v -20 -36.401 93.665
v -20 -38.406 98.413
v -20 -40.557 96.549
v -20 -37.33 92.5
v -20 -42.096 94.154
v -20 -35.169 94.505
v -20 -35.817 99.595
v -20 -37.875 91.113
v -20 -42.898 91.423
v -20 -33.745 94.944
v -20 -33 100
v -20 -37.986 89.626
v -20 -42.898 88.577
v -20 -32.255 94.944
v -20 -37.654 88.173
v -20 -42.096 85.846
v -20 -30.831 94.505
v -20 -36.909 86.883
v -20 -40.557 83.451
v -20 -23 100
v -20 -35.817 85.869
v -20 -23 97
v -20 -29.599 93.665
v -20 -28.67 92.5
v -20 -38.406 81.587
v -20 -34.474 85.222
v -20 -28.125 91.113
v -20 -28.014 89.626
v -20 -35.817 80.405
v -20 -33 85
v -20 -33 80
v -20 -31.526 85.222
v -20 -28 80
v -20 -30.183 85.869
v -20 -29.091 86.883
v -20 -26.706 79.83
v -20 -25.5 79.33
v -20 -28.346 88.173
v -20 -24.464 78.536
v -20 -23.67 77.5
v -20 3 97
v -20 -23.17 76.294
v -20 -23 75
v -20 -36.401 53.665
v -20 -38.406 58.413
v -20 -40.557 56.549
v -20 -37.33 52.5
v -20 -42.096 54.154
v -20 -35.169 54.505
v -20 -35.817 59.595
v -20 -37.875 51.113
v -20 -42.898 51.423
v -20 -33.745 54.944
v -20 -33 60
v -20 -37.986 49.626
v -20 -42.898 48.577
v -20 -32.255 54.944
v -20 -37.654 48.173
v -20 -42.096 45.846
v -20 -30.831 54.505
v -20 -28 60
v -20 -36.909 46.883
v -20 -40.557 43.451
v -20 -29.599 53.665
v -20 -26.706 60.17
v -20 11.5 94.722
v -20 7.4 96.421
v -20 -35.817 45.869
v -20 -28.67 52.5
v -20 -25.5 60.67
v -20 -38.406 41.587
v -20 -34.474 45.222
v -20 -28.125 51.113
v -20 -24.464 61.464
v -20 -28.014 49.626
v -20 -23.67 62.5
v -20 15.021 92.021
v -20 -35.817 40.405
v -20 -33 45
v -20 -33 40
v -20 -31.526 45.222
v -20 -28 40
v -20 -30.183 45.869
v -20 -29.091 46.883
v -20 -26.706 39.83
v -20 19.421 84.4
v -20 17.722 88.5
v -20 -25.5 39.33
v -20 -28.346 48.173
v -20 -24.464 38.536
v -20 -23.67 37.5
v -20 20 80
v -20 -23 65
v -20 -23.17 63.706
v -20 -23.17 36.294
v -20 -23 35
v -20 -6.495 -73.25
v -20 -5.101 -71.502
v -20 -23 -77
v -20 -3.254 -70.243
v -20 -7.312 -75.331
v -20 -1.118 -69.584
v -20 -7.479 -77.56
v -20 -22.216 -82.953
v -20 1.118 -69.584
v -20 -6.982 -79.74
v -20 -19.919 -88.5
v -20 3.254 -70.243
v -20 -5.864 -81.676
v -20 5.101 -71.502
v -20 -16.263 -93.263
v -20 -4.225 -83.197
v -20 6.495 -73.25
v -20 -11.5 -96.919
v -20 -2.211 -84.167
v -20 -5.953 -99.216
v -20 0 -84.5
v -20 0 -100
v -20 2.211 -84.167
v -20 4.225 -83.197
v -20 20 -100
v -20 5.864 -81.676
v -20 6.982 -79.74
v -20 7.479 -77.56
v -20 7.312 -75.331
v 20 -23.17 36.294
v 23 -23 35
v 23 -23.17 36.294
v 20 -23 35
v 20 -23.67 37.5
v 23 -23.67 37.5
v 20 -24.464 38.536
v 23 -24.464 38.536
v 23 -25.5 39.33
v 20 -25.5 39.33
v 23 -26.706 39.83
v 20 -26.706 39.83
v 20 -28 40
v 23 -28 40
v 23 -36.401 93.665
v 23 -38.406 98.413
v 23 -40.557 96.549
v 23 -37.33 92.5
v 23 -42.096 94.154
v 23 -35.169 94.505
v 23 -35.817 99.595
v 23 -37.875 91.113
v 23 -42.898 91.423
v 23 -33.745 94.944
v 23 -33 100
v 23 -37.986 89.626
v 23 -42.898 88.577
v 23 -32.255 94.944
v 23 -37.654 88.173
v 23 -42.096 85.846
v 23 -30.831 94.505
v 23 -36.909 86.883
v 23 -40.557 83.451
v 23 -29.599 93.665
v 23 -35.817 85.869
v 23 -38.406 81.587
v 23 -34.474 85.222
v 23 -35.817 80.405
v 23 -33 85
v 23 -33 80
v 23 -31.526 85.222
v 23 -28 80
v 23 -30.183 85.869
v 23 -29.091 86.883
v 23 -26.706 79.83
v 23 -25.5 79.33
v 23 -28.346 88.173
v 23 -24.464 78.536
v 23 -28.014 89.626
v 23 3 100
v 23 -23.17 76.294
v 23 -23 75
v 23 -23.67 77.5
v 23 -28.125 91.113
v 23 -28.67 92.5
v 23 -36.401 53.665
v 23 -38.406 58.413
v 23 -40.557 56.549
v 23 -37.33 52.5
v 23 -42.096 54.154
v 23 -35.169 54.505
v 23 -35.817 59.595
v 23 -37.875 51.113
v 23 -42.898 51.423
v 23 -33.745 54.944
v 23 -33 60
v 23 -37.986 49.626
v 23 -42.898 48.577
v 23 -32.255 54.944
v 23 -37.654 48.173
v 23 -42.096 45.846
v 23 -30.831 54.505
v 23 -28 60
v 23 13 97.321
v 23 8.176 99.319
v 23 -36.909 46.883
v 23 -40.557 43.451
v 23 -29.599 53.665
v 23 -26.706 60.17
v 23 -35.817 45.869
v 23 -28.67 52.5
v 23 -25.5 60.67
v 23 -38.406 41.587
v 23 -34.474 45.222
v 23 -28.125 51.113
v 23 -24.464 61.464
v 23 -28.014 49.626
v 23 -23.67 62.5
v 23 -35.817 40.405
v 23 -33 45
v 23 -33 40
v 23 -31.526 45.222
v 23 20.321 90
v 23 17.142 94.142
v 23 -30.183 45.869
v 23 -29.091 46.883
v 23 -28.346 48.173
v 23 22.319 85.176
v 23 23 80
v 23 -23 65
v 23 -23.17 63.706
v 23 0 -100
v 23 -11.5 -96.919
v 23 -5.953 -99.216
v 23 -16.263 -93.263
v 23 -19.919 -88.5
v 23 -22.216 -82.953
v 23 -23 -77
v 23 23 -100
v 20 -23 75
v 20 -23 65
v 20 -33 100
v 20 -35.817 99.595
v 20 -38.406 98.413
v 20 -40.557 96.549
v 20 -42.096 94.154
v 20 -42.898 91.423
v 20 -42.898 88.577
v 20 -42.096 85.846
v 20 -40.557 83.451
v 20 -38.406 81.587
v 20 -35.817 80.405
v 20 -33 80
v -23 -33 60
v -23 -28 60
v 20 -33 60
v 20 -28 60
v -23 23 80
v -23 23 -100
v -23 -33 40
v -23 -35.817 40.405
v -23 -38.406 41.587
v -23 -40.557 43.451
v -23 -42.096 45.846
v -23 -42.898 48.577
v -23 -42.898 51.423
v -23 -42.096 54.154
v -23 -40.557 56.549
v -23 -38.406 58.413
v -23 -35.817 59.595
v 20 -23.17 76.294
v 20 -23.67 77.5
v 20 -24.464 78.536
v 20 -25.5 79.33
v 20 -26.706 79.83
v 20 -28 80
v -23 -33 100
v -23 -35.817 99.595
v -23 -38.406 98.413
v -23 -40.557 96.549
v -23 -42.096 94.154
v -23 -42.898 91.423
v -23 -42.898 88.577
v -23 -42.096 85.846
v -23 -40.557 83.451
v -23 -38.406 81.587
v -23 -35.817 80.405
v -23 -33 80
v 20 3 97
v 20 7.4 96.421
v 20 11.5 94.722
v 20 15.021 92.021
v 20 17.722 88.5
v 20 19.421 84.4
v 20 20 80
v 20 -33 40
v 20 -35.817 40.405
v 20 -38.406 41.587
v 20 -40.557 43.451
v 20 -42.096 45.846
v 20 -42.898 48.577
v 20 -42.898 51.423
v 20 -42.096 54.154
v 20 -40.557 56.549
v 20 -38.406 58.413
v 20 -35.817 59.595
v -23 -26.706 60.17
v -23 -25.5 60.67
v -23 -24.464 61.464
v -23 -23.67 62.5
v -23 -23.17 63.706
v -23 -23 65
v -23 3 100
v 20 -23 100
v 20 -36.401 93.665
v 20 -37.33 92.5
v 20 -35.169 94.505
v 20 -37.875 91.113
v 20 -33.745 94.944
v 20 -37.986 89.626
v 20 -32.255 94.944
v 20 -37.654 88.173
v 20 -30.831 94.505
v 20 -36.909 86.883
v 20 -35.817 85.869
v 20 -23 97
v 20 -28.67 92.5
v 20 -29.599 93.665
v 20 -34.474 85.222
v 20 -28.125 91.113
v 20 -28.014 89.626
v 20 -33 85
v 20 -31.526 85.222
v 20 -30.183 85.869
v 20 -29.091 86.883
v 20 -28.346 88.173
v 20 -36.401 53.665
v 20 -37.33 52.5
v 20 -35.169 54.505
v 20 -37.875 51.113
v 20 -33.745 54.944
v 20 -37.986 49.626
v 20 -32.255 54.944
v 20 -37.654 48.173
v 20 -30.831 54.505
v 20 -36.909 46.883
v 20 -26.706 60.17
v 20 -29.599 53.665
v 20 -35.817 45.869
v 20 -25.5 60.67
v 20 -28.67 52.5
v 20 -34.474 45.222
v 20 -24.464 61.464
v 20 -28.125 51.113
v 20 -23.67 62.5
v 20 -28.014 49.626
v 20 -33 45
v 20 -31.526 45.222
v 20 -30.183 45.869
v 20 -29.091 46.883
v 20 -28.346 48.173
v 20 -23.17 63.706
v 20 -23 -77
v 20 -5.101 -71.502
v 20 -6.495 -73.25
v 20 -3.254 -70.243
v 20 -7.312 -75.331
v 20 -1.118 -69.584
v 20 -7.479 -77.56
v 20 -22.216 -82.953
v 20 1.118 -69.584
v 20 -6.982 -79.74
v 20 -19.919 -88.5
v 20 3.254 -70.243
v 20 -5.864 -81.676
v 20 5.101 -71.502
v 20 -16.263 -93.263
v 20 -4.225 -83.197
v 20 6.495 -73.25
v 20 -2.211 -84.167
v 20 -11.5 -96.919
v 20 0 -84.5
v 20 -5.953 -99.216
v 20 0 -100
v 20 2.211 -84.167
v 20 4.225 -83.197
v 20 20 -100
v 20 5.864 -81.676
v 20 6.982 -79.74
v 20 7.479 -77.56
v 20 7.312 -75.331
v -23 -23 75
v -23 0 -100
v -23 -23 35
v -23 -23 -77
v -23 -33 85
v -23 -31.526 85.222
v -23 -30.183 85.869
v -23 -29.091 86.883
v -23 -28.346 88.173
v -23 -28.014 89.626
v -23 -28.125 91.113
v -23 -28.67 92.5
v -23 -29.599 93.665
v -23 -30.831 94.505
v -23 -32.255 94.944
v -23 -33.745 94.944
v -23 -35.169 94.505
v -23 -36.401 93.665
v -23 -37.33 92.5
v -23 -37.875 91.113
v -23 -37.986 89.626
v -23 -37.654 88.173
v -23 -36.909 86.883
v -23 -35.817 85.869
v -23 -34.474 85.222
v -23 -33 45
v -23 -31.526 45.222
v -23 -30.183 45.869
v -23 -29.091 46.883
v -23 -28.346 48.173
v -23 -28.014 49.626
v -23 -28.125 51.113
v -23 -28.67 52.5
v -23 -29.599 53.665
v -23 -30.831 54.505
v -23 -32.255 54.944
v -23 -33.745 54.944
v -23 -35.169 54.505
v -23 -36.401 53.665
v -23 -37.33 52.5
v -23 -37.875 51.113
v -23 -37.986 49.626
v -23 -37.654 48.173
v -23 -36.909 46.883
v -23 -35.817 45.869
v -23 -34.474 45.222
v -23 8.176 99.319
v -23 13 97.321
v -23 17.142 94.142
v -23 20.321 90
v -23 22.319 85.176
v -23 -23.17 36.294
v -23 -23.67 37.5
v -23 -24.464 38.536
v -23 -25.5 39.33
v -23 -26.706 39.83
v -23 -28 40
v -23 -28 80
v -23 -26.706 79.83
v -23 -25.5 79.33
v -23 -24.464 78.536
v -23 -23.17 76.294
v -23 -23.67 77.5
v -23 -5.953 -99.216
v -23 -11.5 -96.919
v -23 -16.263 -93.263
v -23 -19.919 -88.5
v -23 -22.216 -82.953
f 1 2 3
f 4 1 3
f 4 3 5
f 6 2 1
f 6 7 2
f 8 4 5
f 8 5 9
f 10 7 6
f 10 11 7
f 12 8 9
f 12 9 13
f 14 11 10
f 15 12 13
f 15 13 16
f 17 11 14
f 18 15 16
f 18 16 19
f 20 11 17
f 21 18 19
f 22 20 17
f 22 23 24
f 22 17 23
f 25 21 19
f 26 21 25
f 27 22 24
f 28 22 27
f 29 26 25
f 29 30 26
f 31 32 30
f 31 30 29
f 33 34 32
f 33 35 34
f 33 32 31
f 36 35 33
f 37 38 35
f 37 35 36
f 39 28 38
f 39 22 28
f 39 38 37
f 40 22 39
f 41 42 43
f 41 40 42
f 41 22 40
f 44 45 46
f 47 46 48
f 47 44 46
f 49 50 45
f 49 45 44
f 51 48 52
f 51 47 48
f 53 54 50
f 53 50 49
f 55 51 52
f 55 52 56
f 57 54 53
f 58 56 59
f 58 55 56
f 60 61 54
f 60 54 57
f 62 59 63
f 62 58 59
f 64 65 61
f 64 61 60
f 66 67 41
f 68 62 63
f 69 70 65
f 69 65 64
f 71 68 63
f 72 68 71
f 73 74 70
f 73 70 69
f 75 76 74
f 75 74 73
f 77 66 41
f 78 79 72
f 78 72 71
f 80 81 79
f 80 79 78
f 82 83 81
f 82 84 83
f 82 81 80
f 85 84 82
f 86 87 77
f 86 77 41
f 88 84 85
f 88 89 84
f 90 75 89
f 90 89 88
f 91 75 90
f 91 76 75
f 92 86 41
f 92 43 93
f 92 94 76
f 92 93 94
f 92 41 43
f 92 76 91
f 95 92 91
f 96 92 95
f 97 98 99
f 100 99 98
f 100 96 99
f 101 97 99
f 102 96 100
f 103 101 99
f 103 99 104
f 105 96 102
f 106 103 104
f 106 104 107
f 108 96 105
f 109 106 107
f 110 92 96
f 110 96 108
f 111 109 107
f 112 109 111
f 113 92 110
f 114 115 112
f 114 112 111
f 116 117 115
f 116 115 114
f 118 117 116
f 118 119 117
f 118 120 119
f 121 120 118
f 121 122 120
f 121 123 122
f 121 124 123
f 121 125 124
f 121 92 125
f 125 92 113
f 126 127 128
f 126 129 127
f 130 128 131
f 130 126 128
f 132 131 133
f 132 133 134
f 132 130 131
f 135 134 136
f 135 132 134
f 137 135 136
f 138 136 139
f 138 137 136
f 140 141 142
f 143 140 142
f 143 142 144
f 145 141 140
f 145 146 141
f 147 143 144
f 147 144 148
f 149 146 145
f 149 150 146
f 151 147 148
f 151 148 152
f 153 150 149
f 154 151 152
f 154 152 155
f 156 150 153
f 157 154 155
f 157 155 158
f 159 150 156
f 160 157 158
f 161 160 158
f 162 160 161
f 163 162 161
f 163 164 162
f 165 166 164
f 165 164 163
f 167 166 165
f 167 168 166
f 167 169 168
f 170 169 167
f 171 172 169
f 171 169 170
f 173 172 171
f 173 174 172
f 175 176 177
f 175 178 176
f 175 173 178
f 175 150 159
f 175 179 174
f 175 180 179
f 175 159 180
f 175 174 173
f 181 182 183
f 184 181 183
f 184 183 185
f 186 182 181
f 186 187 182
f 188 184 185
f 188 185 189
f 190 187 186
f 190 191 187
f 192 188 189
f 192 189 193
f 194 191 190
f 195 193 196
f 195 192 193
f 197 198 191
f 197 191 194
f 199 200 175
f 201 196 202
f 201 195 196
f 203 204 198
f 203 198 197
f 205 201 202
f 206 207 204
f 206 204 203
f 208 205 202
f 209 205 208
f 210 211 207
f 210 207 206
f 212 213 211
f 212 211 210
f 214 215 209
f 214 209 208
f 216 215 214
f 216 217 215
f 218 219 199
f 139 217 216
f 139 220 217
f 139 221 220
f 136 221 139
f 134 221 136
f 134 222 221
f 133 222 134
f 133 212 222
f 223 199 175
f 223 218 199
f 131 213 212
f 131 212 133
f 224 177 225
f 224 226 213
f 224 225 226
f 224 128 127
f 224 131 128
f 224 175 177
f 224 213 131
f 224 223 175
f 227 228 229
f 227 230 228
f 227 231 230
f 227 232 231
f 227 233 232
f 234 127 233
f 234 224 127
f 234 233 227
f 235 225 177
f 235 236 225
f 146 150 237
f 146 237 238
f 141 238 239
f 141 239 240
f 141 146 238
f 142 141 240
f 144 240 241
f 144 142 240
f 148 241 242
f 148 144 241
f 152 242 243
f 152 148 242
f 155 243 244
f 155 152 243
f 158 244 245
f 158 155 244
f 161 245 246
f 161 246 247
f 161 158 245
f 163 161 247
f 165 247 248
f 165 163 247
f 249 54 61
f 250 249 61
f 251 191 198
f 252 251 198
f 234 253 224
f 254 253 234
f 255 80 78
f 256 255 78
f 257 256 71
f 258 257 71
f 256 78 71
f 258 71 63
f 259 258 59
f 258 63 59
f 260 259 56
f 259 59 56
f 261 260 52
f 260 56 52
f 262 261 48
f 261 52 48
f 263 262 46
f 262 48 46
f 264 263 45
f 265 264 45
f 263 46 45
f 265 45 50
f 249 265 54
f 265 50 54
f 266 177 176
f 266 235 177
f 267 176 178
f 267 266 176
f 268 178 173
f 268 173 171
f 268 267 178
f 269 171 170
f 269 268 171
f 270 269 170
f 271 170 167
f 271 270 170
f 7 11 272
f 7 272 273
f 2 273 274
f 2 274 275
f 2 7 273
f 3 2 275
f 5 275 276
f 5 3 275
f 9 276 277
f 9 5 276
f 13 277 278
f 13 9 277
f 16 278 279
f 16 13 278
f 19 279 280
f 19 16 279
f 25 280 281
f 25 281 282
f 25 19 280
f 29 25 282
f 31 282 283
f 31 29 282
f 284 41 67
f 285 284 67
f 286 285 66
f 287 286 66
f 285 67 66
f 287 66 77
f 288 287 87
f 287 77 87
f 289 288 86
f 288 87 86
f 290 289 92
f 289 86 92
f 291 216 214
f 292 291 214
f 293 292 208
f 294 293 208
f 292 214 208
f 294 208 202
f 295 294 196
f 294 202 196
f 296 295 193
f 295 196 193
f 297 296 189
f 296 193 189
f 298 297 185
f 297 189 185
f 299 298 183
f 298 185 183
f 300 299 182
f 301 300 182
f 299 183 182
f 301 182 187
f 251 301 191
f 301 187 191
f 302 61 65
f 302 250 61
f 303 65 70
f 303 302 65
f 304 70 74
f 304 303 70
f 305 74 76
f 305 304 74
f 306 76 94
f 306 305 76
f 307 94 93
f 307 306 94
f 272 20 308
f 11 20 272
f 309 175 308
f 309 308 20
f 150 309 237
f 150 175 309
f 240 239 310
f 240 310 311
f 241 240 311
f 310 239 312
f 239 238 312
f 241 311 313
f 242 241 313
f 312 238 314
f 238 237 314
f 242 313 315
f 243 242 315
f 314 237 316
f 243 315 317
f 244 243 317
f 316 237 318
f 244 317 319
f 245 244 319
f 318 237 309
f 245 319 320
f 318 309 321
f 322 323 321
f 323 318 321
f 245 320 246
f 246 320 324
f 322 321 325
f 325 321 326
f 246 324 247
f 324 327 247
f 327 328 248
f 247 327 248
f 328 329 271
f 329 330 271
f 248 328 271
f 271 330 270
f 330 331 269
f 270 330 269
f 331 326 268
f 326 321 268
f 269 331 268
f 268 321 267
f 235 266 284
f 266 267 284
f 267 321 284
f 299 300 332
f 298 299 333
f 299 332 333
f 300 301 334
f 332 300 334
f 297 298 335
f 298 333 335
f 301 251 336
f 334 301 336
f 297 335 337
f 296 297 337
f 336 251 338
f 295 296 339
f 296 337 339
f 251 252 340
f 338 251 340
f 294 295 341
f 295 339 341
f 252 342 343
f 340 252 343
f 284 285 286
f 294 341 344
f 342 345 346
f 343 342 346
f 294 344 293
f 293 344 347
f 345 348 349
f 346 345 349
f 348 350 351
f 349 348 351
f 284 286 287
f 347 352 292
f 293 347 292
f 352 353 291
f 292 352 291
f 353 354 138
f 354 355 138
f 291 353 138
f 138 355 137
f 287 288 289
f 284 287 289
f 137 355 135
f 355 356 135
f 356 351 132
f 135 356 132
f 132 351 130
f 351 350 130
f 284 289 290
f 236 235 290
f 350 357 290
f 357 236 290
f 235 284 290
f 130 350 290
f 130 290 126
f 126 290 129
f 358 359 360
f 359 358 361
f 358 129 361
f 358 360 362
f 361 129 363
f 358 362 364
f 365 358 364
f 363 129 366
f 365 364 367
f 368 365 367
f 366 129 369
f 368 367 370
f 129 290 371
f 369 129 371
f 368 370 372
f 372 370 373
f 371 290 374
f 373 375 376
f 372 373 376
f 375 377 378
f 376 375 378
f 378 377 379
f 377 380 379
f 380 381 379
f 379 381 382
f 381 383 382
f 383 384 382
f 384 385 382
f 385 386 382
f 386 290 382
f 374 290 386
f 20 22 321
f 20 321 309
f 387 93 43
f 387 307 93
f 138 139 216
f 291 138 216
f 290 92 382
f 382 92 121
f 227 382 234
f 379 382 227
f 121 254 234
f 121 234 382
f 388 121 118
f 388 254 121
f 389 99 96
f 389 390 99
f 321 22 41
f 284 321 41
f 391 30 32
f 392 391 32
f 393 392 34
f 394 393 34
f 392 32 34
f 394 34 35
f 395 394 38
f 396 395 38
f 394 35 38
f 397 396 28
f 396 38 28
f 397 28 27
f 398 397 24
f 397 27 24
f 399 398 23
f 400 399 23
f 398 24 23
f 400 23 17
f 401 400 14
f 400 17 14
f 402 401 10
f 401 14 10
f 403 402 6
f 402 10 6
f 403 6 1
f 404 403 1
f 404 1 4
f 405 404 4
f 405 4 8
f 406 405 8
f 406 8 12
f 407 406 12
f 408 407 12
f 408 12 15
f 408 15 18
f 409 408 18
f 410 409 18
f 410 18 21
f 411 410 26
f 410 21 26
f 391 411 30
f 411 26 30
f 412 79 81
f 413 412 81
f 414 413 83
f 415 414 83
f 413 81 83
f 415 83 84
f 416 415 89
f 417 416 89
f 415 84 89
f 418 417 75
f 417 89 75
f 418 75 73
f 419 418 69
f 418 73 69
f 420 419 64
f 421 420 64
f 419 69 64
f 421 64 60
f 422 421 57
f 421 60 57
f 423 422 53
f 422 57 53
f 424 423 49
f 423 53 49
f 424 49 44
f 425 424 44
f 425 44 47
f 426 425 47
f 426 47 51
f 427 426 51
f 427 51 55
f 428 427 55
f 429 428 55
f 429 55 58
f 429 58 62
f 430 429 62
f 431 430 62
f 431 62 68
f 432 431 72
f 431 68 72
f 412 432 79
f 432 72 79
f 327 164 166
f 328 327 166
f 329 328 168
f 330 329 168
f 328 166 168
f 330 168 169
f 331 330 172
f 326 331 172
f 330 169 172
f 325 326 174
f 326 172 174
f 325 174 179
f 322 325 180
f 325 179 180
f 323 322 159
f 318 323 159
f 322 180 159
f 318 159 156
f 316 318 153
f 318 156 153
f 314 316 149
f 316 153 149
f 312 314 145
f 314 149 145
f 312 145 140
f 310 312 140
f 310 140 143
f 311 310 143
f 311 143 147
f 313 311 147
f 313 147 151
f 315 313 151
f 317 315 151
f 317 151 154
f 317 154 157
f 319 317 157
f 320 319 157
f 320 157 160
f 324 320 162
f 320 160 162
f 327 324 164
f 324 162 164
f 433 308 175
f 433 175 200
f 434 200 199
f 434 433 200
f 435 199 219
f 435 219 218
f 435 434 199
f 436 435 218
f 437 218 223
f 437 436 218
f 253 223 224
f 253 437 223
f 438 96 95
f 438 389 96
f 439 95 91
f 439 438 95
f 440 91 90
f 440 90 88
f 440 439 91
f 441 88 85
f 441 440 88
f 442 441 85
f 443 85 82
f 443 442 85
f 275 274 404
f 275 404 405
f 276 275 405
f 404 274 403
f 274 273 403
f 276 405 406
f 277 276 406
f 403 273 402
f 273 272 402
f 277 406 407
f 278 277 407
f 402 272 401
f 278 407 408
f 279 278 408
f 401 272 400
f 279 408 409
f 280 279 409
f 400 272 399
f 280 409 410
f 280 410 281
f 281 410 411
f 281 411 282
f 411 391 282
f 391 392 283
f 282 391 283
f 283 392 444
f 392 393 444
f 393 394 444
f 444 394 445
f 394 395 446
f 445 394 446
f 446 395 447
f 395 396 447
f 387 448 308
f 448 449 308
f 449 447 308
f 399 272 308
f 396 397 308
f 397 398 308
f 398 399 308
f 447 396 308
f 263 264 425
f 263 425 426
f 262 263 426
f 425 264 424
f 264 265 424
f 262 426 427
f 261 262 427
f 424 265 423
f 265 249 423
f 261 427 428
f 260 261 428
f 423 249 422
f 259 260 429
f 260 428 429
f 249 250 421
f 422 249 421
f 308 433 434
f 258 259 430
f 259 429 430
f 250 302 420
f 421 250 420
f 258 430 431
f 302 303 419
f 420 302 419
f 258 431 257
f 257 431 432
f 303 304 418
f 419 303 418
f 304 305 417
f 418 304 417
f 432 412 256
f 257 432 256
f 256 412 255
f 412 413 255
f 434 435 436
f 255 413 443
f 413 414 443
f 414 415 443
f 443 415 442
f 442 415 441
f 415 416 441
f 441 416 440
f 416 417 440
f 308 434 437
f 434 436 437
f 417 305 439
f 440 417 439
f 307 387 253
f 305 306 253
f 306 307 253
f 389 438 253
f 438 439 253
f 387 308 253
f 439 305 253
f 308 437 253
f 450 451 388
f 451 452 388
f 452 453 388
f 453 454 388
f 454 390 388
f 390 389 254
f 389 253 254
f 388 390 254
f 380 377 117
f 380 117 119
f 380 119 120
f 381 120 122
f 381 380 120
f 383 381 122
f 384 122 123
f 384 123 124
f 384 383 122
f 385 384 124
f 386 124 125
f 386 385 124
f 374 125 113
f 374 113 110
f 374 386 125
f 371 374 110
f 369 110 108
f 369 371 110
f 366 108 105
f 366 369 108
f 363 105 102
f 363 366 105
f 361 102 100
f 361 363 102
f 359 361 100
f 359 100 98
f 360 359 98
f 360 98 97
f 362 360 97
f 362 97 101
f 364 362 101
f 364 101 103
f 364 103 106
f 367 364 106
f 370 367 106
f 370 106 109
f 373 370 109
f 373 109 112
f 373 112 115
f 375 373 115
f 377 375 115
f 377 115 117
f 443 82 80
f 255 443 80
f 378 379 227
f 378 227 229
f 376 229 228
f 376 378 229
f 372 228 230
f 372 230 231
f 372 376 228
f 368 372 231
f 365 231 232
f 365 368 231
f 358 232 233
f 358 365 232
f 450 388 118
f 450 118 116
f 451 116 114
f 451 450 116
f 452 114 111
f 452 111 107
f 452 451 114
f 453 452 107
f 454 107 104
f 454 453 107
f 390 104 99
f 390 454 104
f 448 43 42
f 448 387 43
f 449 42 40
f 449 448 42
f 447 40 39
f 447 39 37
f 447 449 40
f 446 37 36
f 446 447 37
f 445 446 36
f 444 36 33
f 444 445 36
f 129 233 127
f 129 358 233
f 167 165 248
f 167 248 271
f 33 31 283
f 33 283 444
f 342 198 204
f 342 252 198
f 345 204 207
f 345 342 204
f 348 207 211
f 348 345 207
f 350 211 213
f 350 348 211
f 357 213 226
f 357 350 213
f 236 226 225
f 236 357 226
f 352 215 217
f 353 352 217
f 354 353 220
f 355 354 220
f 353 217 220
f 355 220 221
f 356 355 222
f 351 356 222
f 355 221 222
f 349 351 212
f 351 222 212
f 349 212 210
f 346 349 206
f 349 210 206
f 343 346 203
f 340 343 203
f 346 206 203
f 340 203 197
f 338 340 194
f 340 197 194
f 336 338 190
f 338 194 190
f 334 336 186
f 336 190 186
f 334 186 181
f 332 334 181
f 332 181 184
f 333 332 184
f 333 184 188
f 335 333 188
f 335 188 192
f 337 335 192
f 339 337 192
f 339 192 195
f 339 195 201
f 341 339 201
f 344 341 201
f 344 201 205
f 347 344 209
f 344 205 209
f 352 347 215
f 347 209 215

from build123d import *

# Parameters (mm, degrees)
PROFILE_EXTRUDE_DEPTH               = 23
PROFILE_EXTRUDE_DEPTH_BACK          = 23
PROFILE_SHELL_T                     = -3
CUFF_JOINT_PIN_SKETCH_R             = 7.5
CUFF_JOIN_PIN_EXTRUDE_DEPTH         = 43
HYDRAULIC_ARM_HOLES_SKETCH_R        = 5
HYDRAULIC_ARM_HOLES_EXTRUDE_1_DEPTH = 3
HYDRAULIC_START                     = -43
HYDRAULIC_ARM_HOLES_SKETCH_2_R      = 5
HYDRAULIC_ARM_HOLES_EXTRUDE_2_DEPTH = 3
HOLES_TABS_FILLET_R                 = 5


with BuildPart() as part:
    # Profile Sketch → Profile Extrude (new, two sides: drawn at the far end of the back side and taken through both)
    with BuildSketch(Plane(origin=(0, 0, 0), x_dir=(0, 0, -1), z_dir=(1, 0, 0)).offset(-PROFILE_EXTRUDE_DEPTH_BACK)):
        with BuildLine():
            Line((-80, 23), (100, 23))
            Line((100, 23), (100, 0))
            ThreePointArc((100, 0), (93.263455967, -16.263455967), (77, -23))
            Line((77, -23), (-100, -23))
            Line((-100, -23), (-100, 3))
            ThreePointArc((-100, 3), (-94.142135624, 17.142135624), (-80, 23))
        make_face()
    extrude(amount=PROFILE_EXTRUDE_DEPTH + PROFILE_EXTRUDE_DEPTH_BACK)

    # Profile Shell
    profile_shell_openings = [part.faces().sort_by_distance(p)[0] for p in [
        (0, 11.5, -100),
        (0, -16.263455967, -93.263455967),
        (0, -23, 11.5),
    ]]
    offset(amount=PROFILE_SHELL_T, openings=profile_shell_openings, kind=Kind.INTERSECTION)

    # Cuff Joint Pin Sketch → Cuff Join Pin Extrude (add)
    with BuildSketch(Plane(origin=(23, 0, 0), x_dir=(0, 0, -1), z_dir=(1, 0, 0))):
        with Locations((77, 0)):
            Circle(CUFF_JOINT_PIN_SKETCH_R)
    extrude(amount=-CUFF_JOIN_PIN_EXTRUDE_DEPTH)

    # Hydraulic Arm Holes Sketch → Hydraulic Arm Holes Extrude 1 (add)
    # profile 1 of 2: a face of its own
    with BuildSketch(Plane(origin=(23, 0, 0), x_dir=(0, 0, -1), z_dir=(1, 0, 0))):
        with BuildLine():
            Line((-100, -23), (-100, -33))
            ThreePointArc((-100, -33), (-90, -43), (-80, -33))
            Line((-80, -33), (-80, -23))
            Line((-80, -23), (-100, -23))
        make_face()
        with Locations((-90, -33)):
            Circle(HYDRAULIC_ARM_HOLES_SKETCH_R, mode=Mode.SUBTRACT)
    # profile 2 of 2: a face of its own
    with BuildSketch(Plane(origin=(23, 0, 0), x_dir=(0, 0, -1), z_dir=(1, 0, 0))):
        with BuildLine():
            Line((-60, -33), (-60, -23))
            Line((-60, -23), (-40, -23))
            Line((-40, -23), (-40, -33))
            ThreePointArc((-40, -33), (-50, -43), (-60, -33))
        make_face()
        with Locations((-50, -33)):
            Circle(HYDRAULIC_ARM_HOLES_SKETCH_R, mode=Mode.SUBTRACT)
    extrude(amount=-HYDRAULIC_ARM_HOLES_EXTRUDE_1_DEPTH)

    # Hydraulic Arm Holes Sketch<2> → Hydraulic Arm Holes Extrude 2 (add)
    # profile 1 of 2: a face of its own
    with BuildSketch(Plane(origin=(23, 0, 0), x_dir=(0, 0, -1), z_dir=(1, 0, 0)).offset(HYDRAULIC_START)):
        with BuildLine():
            Line((-100, -23), (-100, -33))
            ThreePointArc((-100, -33), (-90, -43), (-80, -33))
            Line((-80, -33), (-80, -23))
            Line((-80, -23), (-100, -23))
        make_face()
        with Locations((-90, -33)):
            Circle(HYDRAULIC_ARM_HOLES_SKETCH_2_R, mode=Mode.SUBTRACT)
    # profile 2 of 2: a face of its own
    with BuildSketch(Plane(origin=(23, 0, 0), x_dir=(0, 0, -1), z_dir=(1, 0, 0)).offset(HYDRAULIC_START)):
        with BuildLine():
            Line((-60, -33), (-60, -23))
            Line((-60, -23), (-40, -23))
            Line((-40, -23), (-40, -33))
            ThreePointArc((-40, -33), (-50, -43), (-60, -33))
        make_face()
        with Locations((-50, -33)):
            Circle(HYDRAULIC_ARM_HOLES_SKETCH_2_R, mode=Mode.SUBTRACT)
    extrude(amount=-HYDRAULIC_ARM_HOLES_EXTRUDE_2_DEPTH)

    # Holes Tabs Fillet
    holes_tabs_fillet_edges = [part.edges().sort_by_distance(p)[0] for p in [
        (-21.5, -23, 80),
        (21.5, -23, 40),
        (21.5, -23, 60),
        (21.5, -23, 80),
        (-21.5, -23, 40),
        (-21.5, -23, 60),
    ]]
    fillet(holes_tabs_fillet_edges, radius=HOLES_TABS_FILLET_R)


solid = part.part
